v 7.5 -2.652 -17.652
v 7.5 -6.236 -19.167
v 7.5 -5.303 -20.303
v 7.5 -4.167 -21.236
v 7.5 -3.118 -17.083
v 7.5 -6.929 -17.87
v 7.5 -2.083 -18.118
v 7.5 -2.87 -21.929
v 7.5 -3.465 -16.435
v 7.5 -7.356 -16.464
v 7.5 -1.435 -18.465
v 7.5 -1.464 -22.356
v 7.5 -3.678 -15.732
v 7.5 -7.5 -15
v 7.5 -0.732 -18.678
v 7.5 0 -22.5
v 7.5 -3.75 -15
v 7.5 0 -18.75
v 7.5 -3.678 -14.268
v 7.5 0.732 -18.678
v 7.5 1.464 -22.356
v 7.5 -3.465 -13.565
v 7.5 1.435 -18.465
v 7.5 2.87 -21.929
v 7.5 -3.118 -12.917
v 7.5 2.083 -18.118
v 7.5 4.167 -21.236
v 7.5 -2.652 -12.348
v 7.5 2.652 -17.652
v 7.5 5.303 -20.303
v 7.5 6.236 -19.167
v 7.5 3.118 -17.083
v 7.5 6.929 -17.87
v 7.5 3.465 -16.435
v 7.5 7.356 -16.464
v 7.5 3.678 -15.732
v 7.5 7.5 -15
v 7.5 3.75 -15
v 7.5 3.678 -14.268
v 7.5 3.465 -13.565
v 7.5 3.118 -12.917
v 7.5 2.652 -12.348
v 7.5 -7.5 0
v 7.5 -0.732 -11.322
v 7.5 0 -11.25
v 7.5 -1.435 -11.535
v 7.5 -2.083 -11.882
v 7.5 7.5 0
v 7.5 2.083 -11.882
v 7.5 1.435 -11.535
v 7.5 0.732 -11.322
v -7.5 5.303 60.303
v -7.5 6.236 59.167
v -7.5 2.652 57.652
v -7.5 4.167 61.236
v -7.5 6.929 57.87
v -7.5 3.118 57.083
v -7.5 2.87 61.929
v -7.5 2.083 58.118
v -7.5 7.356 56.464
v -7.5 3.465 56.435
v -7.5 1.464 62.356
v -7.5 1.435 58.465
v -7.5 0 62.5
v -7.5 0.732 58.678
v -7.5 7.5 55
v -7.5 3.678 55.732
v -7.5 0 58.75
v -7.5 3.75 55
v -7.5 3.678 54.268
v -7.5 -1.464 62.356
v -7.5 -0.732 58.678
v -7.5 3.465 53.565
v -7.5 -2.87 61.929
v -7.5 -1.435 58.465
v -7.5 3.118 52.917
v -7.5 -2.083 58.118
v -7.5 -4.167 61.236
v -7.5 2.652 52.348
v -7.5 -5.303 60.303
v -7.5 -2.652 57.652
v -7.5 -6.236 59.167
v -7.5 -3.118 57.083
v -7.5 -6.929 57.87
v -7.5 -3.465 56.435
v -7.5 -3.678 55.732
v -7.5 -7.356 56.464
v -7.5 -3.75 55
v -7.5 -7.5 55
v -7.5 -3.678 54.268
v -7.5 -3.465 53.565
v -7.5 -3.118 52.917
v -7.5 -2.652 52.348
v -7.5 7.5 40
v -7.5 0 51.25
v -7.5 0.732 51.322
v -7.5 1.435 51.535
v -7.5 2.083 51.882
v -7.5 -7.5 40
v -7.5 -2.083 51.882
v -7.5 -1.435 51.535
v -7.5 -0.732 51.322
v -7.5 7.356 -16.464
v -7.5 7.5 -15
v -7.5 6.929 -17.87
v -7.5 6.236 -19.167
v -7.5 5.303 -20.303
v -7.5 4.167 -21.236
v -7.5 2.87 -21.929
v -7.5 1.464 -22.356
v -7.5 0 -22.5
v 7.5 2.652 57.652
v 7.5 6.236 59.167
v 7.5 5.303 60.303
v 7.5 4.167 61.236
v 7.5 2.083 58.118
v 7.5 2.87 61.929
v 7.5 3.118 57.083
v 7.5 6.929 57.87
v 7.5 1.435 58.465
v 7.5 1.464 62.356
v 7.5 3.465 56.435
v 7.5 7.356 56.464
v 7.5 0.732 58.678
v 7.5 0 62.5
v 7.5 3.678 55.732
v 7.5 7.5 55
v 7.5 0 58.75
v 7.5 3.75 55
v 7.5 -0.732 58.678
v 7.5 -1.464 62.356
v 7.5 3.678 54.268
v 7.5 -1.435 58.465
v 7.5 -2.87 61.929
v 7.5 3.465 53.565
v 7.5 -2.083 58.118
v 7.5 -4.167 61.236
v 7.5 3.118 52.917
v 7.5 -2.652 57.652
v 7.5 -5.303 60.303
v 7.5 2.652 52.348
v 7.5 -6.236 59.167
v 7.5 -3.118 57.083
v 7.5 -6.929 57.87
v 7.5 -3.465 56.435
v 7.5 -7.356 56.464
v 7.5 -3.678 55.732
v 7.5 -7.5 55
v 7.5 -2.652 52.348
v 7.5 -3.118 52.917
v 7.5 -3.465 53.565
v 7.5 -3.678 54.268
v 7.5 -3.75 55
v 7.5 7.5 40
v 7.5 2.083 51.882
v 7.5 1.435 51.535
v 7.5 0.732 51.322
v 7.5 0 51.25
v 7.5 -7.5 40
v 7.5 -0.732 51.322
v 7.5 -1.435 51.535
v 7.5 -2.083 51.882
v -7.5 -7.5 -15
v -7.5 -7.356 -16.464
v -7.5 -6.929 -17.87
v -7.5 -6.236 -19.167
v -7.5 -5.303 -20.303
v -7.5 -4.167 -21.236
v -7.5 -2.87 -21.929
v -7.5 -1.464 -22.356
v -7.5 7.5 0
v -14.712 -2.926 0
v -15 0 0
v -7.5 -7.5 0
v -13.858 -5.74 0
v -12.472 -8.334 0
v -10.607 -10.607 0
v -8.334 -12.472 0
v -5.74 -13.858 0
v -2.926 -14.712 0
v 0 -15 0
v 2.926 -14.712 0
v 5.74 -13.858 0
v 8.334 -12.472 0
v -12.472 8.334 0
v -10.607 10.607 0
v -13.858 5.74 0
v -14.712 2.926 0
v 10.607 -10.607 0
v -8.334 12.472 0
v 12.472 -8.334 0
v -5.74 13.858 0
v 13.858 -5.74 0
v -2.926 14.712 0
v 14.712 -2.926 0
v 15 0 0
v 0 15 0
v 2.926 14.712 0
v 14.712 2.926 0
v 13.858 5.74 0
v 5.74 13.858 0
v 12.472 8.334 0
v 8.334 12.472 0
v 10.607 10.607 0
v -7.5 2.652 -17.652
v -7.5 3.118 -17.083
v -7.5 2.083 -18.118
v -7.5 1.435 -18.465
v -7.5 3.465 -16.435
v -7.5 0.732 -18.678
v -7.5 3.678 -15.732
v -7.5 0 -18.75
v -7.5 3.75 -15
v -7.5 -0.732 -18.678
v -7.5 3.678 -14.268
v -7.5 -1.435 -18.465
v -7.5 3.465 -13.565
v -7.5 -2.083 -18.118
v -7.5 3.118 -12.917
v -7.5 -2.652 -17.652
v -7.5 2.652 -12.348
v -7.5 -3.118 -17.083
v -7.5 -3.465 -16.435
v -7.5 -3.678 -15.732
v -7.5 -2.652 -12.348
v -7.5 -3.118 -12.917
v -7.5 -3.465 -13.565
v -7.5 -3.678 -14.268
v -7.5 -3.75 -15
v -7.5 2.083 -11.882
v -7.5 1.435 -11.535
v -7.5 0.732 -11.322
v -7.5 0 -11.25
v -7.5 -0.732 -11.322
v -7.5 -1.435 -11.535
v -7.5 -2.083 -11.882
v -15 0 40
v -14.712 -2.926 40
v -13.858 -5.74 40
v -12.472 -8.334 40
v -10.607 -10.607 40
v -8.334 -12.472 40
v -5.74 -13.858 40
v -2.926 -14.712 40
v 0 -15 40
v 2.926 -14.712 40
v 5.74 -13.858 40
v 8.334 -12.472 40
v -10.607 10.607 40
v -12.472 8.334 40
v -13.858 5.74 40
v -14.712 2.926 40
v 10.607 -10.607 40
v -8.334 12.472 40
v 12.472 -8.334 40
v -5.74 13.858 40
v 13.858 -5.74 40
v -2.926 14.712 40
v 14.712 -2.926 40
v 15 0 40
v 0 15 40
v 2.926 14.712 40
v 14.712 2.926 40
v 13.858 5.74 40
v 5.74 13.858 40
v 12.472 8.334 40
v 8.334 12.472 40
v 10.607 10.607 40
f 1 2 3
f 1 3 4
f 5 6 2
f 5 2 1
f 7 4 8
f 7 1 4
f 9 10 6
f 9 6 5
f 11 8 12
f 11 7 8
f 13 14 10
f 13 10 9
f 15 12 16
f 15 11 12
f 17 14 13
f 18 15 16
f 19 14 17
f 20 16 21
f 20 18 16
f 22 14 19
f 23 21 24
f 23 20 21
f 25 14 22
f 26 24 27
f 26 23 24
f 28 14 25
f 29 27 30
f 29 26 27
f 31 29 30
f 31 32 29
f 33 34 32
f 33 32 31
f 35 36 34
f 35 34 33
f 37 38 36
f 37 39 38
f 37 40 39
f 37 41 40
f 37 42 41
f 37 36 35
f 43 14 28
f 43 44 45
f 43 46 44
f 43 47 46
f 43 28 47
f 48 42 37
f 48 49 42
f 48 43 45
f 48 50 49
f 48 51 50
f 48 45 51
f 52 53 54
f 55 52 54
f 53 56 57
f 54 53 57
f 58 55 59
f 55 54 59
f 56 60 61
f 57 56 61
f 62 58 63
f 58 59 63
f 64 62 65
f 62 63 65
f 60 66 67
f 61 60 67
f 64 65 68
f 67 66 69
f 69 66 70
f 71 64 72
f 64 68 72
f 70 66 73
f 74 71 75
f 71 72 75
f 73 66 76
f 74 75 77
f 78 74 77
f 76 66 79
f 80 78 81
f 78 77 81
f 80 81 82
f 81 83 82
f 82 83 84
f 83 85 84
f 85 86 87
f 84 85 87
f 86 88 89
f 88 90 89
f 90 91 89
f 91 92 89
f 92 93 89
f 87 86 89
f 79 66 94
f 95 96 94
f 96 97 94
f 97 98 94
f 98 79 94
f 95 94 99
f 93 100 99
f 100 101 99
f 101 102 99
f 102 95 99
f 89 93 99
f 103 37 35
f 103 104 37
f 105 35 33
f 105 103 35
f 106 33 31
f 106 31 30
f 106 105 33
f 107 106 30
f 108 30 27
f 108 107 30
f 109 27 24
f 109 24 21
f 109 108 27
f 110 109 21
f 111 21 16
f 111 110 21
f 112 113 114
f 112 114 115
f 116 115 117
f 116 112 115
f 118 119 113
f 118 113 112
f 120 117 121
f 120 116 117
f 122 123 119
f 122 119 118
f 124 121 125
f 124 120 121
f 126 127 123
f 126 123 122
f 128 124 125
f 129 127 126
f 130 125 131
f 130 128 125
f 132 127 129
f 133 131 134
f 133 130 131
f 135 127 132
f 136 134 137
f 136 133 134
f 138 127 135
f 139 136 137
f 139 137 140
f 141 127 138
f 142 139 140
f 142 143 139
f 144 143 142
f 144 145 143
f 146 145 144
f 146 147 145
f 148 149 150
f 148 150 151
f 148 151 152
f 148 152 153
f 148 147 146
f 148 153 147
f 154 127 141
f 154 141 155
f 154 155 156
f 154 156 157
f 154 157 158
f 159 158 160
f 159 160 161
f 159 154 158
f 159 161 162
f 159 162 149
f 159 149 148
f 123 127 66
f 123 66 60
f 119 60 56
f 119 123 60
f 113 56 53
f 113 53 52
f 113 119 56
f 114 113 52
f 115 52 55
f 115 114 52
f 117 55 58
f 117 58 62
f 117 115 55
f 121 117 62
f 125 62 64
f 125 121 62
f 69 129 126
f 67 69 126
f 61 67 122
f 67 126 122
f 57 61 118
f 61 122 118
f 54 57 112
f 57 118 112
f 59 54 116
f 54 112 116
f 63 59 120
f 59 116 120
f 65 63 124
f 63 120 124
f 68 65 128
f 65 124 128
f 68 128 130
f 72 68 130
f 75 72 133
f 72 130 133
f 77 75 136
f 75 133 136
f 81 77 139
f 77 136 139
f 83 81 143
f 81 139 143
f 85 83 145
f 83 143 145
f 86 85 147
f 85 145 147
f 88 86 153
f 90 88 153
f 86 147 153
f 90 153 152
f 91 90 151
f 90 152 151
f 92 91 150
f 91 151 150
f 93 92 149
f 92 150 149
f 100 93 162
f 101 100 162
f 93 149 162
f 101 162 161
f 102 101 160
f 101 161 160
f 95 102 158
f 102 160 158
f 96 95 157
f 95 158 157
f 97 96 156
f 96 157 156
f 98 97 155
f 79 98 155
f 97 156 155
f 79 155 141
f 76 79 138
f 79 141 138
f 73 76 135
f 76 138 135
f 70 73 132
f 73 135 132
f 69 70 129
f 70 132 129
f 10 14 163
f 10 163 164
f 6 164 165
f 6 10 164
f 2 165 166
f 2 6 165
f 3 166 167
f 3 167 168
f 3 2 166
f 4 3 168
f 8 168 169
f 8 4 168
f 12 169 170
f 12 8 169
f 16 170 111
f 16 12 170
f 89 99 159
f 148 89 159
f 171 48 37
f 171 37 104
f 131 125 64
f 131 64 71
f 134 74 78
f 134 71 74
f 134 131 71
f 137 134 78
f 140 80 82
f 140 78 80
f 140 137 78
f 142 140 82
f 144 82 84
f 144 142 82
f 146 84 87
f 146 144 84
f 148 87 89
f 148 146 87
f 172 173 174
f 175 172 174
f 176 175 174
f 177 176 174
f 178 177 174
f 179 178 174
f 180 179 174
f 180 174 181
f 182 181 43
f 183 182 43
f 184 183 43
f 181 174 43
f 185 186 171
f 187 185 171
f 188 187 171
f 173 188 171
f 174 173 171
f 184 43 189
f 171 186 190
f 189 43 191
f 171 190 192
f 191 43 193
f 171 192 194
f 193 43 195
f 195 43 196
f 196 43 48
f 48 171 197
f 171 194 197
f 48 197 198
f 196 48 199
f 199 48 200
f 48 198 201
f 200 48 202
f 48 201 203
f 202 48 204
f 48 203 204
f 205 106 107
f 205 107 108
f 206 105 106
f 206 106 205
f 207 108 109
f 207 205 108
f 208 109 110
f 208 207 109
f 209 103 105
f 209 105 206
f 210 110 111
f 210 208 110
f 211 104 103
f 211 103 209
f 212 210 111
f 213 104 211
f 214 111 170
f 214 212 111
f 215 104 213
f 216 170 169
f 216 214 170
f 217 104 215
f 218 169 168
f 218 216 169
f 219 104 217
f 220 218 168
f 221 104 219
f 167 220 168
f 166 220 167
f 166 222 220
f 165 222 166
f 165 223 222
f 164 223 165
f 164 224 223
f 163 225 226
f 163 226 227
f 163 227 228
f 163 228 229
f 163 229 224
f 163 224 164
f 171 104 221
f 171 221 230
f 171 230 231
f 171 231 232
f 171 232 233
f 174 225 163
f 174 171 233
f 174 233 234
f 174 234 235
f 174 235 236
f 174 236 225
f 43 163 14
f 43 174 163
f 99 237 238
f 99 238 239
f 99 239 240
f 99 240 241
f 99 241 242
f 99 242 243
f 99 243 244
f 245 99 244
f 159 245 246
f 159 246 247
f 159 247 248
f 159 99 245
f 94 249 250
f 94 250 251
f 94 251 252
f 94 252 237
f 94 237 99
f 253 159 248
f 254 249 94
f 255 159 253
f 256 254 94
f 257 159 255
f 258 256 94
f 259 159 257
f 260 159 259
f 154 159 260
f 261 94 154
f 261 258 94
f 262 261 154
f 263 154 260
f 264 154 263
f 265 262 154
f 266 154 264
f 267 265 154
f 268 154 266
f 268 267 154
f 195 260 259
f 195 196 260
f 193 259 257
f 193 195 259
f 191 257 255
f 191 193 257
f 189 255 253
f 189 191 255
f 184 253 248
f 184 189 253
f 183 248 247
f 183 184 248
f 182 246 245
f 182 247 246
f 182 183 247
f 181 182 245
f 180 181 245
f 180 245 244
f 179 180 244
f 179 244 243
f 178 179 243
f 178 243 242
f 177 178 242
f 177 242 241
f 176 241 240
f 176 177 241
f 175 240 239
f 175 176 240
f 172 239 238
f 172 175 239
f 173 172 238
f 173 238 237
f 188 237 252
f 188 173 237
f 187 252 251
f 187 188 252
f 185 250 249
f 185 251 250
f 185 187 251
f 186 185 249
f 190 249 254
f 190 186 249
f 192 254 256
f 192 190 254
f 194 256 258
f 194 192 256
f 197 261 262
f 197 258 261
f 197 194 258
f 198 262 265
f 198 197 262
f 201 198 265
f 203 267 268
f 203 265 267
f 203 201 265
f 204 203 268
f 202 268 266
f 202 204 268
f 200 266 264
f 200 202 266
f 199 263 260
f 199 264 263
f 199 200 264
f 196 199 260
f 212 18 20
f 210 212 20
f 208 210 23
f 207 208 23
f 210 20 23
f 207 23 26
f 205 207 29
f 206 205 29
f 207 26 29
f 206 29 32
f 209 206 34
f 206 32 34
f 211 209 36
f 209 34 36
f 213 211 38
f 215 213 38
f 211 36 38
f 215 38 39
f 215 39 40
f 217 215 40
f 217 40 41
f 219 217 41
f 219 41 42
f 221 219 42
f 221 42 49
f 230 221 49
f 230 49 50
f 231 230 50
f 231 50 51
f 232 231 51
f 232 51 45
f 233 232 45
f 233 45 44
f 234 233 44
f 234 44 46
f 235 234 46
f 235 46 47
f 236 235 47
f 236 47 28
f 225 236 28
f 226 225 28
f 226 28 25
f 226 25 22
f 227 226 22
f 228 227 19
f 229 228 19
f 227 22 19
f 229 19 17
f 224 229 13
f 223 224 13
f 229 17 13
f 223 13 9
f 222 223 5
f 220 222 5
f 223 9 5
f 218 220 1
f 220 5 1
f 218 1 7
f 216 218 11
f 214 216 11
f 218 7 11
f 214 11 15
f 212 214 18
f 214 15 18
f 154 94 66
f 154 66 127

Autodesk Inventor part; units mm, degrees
ref_plane "YZ Plane" through (0, 0, 0) normal (1, 0, 0) x (0, 1, 0)
ref_plane "XZ Plane" through (0, 0, 0) normal (0, 1, 0) x (-1, 0, 0)
ref_plane "XY Plane" through (0, 0, 0) normal (0, 0, 1) x (1, 0, 0)
sketch "Sketch1" plane through (0, 0, 0) normal (0, 0, 1) x (1, 0, 0)
  circle A0 centre (0, 0) radius 15
  dimension "d0" = 30
extrude "Extrusion1" add sketch "Sketch1" along normal blind 40
sketch "Sketch2" plane through (0, 0, 40) normal (0, 0, 1) x (1, 0, 0)
  line L0 (7.5, 7.5) -> (7.5, -7.5)
  line L1 (-7.5, 7.5) -> (-7.5, -7.5)
  line L2 (-7.5, 7.5) -> (7.5, 7.5)
  line L3 (-7.5, -7.5) -> (7.5, -7.5)
  point P0 (0, 0)
  dimension "d3" = 7.5
  dimension "d4" = 7.5
  dimension "d5" = 7.5
  dimension "d6" = 7.5
extrude "Extrusion2" add sketch "Sketch2" along normal blind 22.5
fillet "Fillet1" radius 7.5 2 edges at (0, 7.5, 62.5) (0, -7.5, 62.5)
sketch "Sketch3" plane through (0, 0, 0) normal (1, 0, 0) x (0, 1, 0)
  line L0 (7.5, 40) -> (7.5, 55) projected
  line L1 (-7.5, 40) -> (-7.5, 55) projected
  line L2 (7.5, 55) -> (-7.5, 55) construction
  circle A0 centre (0, 55) radius 3.75
  point P0 (0, 0)
  dimension "d10" = 7.5
extrude "Extrusion3" cut sketch "Sketch3" along normal through all both and the other way through all
sketch "Sketch4" plane through (0, 0, 0) normal (0, 0, -1) x (-1, 0, 0)
  line L0 (-7.5, 7.5) -> (7.5, 7.5)
  line L1 (7.5, 7.5) -> (7.5, -7.5)
  line L2 (7.5, -7.5) -> (-7.5, -7.5)
  line L3 (-7.5, -7.5) -> (-7.5, 7.5)
  line L4 (-7.5, 7.5) -> (7.5, -7.5) construction
  line L5 (7.5, 7.5) -> (-7.5, -7.5) construction
  point P0 (0, 0)
  dimension "d13" = 15
  dimension "d14" = 15
extrude "Extrusion4" add sketch "Sketch4" along normal blind 22.5
fillet "Fillet2" radius 7.5 2 edges at (0, 7.5, -22.5) (0, -7.5, -22.5)
sketch "Sketch5" plane through (7.5, -7.5, 0) normal (1, 0, 0) x (0, 0, -1)
  line L0 (0, 15) -> (15, 15) projected
  line L1 (0, 0) -> (15, 0) projected
  line L2 (15, 15) -> (15, 0) construction
  circle A0 centre (15, 7.5) radius 3.75
  point P0 (0, 7.5)
  dimension "d18" = 7.5
extrude "Extrusion5" cut sketch "Sketch5" against normal through all
properties part number "Neck"
